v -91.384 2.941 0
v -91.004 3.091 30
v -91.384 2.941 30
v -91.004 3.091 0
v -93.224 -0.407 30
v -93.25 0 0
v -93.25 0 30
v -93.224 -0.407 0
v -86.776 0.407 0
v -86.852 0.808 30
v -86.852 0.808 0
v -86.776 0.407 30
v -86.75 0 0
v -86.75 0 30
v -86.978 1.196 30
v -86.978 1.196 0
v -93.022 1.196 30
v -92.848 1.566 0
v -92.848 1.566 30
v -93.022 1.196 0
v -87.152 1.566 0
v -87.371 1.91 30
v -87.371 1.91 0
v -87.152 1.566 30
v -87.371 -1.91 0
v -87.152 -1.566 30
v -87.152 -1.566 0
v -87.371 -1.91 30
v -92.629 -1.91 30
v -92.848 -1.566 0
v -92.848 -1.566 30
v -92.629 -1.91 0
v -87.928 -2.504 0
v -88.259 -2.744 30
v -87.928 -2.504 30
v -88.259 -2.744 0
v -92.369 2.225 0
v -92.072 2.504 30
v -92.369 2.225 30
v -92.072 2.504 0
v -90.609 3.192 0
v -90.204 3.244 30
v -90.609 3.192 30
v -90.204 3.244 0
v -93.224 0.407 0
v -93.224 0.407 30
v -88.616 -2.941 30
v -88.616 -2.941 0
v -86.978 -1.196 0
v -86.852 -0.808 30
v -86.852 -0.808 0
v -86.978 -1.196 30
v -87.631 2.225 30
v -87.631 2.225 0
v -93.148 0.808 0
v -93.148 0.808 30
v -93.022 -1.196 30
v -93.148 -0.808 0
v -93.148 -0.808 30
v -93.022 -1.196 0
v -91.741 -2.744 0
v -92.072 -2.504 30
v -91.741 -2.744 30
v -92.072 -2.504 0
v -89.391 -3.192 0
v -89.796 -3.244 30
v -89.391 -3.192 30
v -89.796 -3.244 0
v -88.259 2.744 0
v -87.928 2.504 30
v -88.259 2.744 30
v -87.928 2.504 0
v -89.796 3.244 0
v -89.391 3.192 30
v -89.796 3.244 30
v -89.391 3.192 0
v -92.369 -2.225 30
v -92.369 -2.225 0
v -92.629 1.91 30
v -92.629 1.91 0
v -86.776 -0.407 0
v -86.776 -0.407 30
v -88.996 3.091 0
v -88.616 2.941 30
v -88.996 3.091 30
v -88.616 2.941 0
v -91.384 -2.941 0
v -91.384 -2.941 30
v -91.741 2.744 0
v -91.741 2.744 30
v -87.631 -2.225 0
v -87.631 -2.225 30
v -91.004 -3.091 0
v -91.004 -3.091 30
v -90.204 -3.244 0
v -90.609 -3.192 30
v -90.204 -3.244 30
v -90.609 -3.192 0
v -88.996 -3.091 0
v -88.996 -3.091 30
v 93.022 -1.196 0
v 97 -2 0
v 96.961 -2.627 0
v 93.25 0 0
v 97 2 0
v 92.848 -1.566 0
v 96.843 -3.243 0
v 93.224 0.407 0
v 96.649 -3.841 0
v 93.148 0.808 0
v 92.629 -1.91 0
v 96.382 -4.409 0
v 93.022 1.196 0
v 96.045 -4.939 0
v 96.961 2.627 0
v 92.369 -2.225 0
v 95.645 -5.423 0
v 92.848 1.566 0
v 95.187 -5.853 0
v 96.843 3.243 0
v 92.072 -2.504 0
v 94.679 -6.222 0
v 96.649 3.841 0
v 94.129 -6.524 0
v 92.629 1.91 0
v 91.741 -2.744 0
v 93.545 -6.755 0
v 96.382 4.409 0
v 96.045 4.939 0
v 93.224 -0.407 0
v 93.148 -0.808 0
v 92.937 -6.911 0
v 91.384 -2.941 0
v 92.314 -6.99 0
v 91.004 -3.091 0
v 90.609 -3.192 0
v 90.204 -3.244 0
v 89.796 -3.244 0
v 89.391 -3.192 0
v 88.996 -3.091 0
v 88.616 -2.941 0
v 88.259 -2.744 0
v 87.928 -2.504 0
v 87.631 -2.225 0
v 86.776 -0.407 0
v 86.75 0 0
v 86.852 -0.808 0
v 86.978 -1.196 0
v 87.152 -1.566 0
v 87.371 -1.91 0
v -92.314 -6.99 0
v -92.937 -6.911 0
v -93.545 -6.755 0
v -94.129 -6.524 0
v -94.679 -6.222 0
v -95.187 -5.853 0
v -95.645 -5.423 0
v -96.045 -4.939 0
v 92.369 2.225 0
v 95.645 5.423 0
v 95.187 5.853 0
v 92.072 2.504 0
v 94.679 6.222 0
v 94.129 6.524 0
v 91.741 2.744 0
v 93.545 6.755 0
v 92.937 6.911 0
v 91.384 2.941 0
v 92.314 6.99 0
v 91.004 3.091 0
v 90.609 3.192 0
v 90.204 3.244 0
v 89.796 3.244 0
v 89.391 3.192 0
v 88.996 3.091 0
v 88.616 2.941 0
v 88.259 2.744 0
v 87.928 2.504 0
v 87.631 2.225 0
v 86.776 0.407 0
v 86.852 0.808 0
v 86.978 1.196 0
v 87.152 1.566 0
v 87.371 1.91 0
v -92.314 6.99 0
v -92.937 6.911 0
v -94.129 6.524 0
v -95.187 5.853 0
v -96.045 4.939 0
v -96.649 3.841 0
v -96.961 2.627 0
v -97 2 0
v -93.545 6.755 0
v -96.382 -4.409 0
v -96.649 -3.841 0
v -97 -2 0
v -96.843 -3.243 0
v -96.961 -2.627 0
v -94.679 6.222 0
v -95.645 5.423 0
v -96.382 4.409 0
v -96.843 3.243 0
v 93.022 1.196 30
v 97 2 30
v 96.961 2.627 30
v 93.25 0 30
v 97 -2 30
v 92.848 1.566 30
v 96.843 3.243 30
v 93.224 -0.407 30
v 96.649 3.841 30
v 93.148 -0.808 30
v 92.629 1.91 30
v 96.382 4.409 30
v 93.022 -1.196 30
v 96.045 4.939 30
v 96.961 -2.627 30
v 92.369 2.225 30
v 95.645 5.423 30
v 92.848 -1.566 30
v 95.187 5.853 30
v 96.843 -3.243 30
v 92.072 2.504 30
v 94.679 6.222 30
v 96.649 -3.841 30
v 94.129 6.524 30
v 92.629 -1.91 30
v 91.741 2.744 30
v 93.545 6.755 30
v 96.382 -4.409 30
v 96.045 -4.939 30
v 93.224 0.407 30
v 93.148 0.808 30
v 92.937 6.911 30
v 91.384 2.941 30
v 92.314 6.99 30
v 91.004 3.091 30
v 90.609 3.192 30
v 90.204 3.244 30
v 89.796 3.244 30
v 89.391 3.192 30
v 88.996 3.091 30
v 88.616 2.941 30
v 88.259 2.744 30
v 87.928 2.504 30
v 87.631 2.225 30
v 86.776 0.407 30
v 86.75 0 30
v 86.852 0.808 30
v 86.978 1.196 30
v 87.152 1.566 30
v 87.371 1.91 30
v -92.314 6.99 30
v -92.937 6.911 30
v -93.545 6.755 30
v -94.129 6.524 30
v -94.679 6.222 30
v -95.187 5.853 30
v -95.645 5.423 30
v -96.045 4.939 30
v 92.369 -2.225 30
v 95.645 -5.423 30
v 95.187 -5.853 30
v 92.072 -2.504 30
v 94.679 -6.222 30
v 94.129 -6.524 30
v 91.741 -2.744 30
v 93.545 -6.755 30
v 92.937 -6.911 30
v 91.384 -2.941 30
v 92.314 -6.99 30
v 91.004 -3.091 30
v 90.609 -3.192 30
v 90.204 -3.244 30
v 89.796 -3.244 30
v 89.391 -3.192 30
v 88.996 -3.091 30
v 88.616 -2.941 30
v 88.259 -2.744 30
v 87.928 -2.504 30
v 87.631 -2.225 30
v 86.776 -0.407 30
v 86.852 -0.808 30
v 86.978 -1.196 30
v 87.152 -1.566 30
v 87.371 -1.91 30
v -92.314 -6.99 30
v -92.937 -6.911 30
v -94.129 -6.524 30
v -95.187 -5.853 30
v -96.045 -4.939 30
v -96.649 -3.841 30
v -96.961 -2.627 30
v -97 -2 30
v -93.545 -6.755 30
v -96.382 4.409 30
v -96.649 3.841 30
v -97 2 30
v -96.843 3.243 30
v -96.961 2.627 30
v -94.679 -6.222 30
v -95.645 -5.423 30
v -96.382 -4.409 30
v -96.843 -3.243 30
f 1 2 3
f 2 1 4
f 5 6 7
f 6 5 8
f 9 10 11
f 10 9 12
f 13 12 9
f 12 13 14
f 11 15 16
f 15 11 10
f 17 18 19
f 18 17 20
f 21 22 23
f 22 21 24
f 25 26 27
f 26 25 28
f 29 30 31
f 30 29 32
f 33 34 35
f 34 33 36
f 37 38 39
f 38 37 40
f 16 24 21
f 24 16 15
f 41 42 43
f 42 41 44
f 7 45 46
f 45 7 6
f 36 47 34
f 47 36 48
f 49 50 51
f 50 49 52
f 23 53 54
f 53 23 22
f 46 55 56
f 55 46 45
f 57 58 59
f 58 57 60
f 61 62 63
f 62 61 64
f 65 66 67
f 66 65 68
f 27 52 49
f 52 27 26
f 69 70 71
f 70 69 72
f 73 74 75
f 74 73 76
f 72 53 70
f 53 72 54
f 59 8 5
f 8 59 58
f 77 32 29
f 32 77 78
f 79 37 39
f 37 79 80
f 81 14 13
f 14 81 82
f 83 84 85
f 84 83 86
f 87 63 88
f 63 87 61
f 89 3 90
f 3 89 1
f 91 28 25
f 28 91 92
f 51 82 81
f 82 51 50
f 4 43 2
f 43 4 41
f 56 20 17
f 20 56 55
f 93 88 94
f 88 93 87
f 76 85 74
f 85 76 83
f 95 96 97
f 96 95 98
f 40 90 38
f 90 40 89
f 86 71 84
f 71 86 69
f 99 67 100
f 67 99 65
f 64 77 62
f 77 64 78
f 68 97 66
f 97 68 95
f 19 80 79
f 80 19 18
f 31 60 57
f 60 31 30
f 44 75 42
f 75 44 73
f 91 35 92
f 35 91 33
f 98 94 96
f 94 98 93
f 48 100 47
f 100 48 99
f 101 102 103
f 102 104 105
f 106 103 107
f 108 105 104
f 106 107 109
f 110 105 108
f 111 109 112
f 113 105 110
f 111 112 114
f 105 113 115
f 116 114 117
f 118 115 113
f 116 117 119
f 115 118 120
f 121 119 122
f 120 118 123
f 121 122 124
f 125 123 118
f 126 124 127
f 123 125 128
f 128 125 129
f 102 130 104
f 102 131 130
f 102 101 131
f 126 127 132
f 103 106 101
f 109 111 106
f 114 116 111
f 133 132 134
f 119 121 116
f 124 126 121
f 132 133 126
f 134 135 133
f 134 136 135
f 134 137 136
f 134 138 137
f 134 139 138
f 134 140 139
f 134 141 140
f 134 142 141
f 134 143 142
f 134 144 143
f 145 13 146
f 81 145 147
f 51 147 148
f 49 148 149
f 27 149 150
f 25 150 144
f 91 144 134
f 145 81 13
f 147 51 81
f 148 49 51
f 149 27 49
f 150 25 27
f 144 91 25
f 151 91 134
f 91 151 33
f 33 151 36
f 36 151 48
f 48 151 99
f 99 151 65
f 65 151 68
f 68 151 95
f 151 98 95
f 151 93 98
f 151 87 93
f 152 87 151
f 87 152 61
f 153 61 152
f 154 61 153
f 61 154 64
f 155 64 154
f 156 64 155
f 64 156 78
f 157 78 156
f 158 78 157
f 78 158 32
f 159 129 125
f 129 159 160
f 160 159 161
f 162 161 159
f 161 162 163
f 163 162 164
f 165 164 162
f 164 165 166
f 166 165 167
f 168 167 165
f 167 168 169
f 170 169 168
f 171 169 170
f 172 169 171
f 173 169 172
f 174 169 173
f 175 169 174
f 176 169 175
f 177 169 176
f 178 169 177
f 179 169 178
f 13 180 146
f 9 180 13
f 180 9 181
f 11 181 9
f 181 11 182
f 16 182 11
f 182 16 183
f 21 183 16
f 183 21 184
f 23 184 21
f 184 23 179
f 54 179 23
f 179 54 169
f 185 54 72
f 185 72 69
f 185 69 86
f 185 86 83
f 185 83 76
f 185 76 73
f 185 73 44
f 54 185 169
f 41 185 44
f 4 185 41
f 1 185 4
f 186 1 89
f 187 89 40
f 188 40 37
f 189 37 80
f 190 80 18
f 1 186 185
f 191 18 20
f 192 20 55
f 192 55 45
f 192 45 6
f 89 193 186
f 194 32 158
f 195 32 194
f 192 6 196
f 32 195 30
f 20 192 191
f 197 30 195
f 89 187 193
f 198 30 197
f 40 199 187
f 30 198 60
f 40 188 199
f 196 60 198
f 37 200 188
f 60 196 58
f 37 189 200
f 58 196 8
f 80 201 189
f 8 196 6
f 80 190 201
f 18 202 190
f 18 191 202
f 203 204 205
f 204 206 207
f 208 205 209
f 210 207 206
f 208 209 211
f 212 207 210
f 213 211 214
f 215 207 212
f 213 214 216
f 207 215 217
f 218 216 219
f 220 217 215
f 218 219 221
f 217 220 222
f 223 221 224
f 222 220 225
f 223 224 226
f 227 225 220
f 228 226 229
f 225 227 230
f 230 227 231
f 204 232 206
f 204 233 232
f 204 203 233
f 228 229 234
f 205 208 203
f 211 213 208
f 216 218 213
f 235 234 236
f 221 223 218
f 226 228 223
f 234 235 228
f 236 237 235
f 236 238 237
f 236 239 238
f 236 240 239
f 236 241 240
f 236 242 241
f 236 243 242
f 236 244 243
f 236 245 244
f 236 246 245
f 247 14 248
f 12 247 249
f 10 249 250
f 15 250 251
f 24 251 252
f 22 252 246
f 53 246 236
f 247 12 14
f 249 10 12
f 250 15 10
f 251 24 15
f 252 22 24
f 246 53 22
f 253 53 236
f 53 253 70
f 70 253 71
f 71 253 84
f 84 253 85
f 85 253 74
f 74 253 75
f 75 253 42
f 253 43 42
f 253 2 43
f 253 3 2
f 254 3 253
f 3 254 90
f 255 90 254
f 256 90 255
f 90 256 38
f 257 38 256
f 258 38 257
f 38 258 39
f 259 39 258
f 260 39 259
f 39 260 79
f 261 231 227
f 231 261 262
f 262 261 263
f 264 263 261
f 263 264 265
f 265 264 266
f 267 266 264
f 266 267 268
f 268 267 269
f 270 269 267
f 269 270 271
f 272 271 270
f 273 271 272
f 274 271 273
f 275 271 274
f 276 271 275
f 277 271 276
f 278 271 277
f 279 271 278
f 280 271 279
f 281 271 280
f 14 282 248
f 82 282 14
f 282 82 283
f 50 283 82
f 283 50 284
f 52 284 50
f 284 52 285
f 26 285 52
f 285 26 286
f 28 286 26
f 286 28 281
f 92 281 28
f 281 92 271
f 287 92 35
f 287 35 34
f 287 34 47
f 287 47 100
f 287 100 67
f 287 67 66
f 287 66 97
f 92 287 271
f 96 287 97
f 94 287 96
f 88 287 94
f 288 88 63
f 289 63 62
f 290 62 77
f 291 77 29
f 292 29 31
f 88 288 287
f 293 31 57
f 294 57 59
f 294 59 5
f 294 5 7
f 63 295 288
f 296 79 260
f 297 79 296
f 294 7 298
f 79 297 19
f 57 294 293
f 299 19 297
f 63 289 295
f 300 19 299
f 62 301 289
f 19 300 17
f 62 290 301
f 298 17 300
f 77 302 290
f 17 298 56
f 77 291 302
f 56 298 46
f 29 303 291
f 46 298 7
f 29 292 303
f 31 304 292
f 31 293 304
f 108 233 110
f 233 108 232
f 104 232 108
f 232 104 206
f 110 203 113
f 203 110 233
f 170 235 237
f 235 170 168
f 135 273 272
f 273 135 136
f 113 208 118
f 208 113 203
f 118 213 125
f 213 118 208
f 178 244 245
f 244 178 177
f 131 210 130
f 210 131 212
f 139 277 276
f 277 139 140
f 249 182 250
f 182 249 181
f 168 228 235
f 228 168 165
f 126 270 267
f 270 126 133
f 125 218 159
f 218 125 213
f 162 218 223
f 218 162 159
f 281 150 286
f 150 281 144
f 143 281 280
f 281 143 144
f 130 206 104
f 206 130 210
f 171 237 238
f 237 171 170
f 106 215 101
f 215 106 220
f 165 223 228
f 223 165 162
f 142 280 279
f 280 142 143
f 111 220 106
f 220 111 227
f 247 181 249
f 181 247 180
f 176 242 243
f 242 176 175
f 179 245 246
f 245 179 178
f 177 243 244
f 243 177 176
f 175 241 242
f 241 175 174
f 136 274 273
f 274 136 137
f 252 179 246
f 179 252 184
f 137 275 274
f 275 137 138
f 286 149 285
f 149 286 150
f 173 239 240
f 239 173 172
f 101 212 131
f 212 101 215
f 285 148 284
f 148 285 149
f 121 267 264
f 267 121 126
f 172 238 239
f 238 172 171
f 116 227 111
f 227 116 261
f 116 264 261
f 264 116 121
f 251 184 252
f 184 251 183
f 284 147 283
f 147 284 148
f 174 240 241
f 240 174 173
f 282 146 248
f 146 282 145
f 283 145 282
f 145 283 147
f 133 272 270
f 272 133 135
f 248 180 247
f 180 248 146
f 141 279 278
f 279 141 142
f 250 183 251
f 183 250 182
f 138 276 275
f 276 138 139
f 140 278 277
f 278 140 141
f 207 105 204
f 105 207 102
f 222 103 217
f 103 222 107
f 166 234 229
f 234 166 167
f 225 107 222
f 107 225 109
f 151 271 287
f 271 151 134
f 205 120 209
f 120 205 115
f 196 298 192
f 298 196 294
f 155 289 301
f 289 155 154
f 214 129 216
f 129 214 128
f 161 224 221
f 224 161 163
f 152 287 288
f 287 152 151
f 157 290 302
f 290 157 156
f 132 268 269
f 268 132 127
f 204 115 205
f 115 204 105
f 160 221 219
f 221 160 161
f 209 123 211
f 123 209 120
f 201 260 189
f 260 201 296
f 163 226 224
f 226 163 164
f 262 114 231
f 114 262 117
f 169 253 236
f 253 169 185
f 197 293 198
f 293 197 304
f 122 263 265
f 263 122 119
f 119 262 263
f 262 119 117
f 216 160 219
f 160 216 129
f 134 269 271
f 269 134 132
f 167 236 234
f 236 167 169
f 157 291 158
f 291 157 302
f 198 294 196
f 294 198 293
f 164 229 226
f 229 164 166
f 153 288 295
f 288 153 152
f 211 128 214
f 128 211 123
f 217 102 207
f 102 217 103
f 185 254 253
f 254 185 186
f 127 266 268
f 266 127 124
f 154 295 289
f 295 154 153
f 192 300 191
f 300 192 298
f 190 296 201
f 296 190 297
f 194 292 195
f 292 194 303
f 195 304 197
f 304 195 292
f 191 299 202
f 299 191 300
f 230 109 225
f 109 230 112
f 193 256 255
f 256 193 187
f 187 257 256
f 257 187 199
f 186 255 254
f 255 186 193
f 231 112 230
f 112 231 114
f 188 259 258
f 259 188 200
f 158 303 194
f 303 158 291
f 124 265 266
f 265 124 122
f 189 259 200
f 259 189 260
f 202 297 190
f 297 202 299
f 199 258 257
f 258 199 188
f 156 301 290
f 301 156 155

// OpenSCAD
$fn = 50;


difference() {
	union() {
		hull() {
			translate(v = [-92.0000000000, 2.0000000000, 0]) {
				cylinder(h = 30, r = 5);
			}
			translate(v = [92.0000000000, 2.0000000000, 0]) {
				cylinder(h = 30, r = 5);
			}
			translate(v = [-92.0000000000, -2.0000000000, 0]) {
				cylinder(h = 30, r = 5);
			}
			translate(v = [92.0000000000, -2.0000000000, 0]) {
				cylinder(h = 30, r = 5);
			}
		}
	}
	union() {
		translate(v = [-90.0000000000, 0.0000000000, 0]) {
			cylinder(h = 30, r = 3.2500000000);
		}
		translate(v = [90.0000000000, 0.0000000000, 0]) {
			cylinder(h = 30, r = 3.2500000000);
		}
		translate(v = [-90.0000000000, 0.0000000000, 0]) {
			cylinder(h = 30, r = 1.8000000000);
		}
		translate(v = [90.0000000000, 0.0000000000, 0]) {
			cylinder(h = 30, r = 1.8000000000);
		}
		translate(v = [-90.0000000000, 0.0000000000, 0]) {
			cylinder(h = 30, r = 1.8000000000);
		}
		translate(v = [90.0000000000, 0.0000000000, 0]) {
			cylinder(h = 30, r = 1.8000000000);
		}
		translate(v = [-90.0000000000, 0.0000000000, 0]) {
			cylinder(h = 30, r = 1.8000000000);
		}
		translate(v = [90.0000000000, 0.0000000000, 0]) {
			cylinder(h = 30, r = 1.8000000000);
		}
	}
}
